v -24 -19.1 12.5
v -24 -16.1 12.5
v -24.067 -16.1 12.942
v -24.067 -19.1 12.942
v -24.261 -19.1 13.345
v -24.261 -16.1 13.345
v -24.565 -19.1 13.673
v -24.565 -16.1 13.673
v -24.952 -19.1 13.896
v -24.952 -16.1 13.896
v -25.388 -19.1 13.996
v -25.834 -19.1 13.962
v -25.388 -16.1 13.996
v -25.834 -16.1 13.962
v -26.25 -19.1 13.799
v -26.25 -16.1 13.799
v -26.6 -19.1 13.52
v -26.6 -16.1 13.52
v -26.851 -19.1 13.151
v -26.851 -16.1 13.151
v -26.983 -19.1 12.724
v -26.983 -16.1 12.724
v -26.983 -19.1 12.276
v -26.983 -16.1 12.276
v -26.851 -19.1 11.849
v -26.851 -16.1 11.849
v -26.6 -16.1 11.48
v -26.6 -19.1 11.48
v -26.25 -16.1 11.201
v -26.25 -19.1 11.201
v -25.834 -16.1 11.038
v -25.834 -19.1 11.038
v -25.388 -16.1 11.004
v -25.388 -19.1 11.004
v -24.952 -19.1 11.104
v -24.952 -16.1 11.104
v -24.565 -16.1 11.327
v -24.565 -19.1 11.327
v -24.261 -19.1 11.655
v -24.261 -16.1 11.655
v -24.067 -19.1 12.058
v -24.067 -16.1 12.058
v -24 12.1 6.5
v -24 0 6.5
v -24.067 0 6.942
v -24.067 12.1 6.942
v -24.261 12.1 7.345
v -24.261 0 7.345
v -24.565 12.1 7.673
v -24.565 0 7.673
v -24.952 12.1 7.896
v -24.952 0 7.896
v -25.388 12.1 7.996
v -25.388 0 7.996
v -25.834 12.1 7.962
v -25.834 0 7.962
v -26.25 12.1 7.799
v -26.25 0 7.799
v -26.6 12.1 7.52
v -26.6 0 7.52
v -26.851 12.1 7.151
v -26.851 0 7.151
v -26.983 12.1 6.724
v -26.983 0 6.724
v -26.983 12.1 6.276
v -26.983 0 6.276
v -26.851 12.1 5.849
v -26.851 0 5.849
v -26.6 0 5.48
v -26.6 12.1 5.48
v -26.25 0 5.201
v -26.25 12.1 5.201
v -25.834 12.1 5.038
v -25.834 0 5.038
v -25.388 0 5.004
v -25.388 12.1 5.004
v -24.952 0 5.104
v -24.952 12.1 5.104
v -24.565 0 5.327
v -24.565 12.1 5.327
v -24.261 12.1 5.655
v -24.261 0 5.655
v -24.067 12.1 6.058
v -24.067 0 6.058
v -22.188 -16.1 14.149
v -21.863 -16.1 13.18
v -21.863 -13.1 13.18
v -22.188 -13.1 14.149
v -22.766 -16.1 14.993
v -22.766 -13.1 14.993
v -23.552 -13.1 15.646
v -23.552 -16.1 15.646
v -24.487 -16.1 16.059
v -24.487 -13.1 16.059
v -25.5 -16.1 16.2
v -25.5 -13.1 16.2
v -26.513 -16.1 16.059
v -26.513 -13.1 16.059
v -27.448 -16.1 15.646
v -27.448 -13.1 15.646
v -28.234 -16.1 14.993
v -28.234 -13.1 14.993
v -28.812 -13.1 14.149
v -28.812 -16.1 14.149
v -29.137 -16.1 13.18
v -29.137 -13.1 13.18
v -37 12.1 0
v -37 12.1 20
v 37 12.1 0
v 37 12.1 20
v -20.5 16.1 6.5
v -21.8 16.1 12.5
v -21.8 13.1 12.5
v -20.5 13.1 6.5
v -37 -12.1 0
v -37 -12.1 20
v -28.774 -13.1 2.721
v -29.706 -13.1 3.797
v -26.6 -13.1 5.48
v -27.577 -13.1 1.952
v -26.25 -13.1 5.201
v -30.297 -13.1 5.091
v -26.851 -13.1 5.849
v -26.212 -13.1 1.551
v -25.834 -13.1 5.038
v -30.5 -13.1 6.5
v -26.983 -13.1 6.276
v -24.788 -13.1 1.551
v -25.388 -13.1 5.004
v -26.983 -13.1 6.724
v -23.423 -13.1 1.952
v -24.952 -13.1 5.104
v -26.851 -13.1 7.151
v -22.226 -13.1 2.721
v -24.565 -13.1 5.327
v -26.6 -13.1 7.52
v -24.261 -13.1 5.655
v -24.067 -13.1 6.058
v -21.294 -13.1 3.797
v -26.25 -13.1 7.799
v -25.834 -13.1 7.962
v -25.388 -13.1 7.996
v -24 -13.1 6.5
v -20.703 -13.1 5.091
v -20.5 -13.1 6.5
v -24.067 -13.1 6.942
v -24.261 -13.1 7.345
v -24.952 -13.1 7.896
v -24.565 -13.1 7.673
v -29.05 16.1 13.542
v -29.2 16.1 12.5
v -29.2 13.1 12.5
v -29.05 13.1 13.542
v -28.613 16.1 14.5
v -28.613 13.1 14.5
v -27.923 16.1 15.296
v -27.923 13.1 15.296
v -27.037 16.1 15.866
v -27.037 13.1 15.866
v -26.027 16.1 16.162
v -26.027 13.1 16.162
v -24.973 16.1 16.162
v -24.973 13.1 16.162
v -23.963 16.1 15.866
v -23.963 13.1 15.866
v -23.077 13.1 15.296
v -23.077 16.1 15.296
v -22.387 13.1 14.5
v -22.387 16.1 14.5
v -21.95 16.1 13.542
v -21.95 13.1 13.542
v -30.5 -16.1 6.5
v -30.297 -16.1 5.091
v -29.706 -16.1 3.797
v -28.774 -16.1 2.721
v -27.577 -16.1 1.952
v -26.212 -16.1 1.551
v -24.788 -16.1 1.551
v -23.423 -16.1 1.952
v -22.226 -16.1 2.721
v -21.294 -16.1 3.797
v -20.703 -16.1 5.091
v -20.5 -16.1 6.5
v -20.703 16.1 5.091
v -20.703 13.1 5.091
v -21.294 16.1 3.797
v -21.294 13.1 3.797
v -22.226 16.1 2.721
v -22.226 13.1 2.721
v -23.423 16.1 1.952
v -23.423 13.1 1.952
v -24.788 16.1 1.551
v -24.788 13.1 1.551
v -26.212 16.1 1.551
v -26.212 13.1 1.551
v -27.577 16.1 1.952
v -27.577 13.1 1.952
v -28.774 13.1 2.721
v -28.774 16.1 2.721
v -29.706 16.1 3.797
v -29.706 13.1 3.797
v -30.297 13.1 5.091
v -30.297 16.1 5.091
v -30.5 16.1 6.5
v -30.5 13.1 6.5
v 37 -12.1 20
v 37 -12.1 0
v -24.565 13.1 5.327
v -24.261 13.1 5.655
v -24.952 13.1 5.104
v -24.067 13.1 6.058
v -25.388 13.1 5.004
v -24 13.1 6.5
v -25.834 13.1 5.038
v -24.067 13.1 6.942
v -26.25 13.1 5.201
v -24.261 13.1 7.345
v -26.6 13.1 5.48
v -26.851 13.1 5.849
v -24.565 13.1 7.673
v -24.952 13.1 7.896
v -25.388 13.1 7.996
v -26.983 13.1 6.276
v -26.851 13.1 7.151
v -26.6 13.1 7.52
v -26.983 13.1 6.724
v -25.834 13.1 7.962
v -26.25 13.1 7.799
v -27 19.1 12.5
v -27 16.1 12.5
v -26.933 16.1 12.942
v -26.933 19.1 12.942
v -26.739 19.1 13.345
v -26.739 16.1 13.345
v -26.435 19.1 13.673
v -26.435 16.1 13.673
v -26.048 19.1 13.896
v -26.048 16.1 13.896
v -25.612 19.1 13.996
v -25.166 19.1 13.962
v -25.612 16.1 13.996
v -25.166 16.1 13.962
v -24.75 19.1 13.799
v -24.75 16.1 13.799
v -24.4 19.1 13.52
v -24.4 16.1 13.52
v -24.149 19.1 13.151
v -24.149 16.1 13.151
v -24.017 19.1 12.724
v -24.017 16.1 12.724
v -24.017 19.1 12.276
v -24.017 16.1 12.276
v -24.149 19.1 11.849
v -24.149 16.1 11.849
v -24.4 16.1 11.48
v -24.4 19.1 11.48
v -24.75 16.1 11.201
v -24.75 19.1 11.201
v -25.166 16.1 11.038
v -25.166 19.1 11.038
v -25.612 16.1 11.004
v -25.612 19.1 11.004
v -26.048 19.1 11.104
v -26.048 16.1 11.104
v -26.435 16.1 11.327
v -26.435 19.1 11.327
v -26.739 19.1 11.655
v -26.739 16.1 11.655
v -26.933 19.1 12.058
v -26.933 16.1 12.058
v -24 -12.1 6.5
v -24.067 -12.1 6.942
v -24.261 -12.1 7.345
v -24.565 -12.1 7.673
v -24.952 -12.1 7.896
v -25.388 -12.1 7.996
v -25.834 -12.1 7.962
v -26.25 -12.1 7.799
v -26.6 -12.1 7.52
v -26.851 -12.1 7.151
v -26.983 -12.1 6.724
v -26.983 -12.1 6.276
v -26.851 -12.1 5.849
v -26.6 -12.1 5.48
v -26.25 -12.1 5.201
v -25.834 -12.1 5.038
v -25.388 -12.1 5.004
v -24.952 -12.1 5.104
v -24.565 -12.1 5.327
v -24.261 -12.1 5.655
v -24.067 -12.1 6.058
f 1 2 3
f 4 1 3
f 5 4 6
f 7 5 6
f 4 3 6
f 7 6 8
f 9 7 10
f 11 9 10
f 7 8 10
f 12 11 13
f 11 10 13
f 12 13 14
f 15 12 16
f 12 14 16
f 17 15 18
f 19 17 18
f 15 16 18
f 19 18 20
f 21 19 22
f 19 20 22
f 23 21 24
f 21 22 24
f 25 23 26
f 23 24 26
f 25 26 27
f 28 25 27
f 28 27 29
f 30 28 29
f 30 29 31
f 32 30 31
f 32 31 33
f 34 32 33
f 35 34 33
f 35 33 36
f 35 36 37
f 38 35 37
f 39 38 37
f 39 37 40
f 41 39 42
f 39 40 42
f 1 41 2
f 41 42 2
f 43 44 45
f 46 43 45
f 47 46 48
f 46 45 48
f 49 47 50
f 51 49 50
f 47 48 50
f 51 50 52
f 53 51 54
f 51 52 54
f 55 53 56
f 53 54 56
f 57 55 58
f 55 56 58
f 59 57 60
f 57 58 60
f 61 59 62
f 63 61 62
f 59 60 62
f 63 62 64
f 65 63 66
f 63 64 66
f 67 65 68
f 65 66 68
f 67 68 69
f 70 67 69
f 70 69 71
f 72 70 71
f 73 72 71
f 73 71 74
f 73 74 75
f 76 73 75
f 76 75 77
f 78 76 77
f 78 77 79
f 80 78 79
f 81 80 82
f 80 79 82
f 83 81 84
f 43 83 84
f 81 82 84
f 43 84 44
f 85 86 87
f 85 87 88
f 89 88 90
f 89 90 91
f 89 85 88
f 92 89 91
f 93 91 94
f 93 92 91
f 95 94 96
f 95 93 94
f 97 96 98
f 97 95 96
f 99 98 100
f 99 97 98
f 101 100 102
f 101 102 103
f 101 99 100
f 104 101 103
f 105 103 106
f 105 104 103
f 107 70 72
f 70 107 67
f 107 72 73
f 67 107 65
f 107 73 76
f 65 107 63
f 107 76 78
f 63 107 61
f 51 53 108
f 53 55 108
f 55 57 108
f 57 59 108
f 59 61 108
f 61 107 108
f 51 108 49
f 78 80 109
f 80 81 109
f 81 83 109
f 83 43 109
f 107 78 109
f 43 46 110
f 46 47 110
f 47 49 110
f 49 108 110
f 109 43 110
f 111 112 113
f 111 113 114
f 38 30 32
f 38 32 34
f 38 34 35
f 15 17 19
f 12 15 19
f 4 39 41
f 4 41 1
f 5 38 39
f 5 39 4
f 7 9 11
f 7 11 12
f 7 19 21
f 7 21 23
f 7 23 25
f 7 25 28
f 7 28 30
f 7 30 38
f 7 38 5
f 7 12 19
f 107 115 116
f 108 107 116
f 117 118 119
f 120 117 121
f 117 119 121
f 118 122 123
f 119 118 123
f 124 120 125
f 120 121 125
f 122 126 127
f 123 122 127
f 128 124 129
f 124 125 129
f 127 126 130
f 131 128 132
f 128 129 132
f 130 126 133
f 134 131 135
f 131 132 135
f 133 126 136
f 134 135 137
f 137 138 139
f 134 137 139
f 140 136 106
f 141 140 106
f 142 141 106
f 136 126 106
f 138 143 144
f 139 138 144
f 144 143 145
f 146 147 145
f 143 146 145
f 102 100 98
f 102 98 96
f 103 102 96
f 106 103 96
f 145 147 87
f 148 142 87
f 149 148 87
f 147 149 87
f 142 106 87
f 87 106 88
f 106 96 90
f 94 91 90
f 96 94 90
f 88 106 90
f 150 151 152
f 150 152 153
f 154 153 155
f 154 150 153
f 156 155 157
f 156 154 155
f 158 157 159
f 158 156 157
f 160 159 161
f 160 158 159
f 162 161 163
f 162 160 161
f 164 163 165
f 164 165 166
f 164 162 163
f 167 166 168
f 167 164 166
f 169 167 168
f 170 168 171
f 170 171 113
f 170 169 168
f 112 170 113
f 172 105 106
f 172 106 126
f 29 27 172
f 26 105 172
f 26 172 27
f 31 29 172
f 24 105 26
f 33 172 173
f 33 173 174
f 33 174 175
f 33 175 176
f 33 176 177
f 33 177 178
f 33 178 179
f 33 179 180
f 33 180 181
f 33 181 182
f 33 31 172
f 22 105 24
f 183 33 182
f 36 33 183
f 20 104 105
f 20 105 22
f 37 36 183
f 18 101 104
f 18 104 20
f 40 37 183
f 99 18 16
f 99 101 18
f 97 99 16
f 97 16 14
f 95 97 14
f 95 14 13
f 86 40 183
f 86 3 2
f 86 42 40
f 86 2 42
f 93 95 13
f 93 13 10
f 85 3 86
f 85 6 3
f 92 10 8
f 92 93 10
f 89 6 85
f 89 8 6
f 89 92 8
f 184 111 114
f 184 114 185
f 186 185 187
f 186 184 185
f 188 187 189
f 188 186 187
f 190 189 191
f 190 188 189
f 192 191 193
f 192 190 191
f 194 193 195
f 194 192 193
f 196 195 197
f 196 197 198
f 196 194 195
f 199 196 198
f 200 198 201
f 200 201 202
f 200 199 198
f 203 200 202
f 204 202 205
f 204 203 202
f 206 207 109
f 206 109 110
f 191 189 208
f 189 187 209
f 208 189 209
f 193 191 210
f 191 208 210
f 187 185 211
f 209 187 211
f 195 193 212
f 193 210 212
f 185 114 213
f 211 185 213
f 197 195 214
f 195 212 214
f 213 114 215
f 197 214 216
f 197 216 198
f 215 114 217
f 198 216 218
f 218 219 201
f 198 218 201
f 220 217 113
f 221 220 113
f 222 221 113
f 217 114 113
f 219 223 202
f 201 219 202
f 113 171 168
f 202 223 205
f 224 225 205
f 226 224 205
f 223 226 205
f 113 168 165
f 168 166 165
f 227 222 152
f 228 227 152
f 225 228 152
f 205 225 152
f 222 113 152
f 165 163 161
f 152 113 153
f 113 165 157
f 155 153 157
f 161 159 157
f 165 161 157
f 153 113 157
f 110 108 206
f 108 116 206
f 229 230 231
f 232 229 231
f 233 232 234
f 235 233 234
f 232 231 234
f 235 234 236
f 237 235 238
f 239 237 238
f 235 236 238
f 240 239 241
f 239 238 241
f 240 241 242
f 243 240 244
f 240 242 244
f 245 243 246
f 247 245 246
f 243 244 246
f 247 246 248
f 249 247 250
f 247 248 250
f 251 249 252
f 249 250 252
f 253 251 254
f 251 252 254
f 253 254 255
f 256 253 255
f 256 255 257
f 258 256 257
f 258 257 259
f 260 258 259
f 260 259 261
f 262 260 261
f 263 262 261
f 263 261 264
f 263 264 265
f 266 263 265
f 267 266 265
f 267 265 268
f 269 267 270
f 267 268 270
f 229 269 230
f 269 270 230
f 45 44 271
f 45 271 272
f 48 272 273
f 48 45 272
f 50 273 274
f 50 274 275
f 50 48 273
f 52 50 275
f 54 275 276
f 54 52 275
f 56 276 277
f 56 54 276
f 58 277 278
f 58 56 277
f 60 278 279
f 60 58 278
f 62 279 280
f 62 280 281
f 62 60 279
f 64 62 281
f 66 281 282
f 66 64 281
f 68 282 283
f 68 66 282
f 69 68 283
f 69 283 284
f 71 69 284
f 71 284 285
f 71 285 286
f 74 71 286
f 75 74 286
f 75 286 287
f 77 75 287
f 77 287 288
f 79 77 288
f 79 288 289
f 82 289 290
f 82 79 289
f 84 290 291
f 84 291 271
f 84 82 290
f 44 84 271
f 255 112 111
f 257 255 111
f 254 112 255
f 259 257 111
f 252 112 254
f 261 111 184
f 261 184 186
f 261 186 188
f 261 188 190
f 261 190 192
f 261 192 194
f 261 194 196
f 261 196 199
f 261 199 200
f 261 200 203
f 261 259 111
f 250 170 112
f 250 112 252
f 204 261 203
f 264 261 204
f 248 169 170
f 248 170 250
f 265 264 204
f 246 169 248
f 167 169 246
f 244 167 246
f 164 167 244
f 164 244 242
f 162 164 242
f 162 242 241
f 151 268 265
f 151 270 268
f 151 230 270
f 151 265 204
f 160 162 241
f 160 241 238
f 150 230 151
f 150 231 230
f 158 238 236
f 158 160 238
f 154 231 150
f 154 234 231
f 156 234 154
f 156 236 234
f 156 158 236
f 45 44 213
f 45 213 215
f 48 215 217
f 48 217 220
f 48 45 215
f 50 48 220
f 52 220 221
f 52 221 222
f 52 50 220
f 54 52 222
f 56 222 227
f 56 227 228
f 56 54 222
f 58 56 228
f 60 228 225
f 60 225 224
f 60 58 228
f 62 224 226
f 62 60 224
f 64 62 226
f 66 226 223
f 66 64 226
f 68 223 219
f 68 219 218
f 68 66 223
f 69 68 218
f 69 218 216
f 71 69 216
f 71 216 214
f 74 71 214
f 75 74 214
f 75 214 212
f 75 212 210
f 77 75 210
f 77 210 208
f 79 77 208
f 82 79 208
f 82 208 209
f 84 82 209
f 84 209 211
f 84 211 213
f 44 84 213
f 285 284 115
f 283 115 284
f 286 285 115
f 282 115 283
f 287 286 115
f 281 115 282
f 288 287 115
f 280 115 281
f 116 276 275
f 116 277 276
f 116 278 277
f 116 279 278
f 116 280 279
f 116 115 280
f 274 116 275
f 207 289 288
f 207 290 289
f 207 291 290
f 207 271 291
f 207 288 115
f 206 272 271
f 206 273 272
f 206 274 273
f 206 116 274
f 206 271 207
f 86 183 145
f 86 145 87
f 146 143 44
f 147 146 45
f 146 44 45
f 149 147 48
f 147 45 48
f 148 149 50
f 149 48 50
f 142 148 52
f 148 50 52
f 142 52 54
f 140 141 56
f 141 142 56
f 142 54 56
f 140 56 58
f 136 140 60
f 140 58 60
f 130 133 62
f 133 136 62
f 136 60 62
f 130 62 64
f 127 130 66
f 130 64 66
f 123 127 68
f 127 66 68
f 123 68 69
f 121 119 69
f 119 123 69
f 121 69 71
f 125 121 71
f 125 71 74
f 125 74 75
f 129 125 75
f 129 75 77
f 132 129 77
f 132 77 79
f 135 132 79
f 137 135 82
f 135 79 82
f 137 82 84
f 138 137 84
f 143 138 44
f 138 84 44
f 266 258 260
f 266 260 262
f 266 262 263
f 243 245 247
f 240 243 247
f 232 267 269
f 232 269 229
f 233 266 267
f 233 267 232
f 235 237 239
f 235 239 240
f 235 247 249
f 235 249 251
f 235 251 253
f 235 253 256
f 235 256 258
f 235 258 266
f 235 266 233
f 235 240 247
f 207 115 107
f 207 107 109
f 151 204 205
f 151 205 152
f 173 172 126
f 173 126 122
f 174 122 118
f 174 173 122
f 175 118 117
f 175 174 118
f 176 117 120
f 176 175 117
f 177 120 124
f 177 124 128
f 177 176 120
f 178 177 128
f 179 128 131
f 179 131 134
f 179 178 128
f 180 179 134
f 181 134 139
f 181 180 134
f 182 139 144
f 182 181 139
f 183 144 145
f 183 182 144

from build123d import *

# Parameters (mm, degrees)
F0_W          = 74
F0_H          = 20
F0_R          = 1.5
F1_DEPTH      = 12.1
F1_DEPTH_BACK = 12.1
F2_R          = 1.5
F3_DEPTH      = 16.1
F3_DEPTH_BACK = 16.1
F5_DEPTH      = 3
F7_DEPTH      = 3
F8_R          = 1.5
F9_DEPTH      = 3
F10_R         = 1.5
F11_DEPTH     = 3


with BuildPart() as f1:
    # F0 (on Front) → F1 (new body, two sides)
    with BuildSketch(Plane.XZ) as f1_sk:
        with Locations((0, 10)):
            Rectangle(F0_W, F0_H)
        with Locations((-25.5, 6.5)):
            Circle(F0_R, mode=Mode.SUBTRACT)
    extrude(amount=F1_DEPTH)
    extrude(f1_sk.sketch, amount=-F1_DEPTH_BACK)


with BuildPart() as f3:
    # F2 (on Front) → F3 (new body, two sides)
    with BuildSketch(Plane.XZ) as f3_sk:
        with Locations((-25.5, 6.5)):
            Circle(F2_R)
    extrude(amount=-F3_DEPTH)
    extrude(f3_sk.sketch, amount=F3_DEPTH_BACK)

    # F4 (on face) → F5 (join)
    with BuildSketch(Plane.XZ.offset(16.1)):
        with BuildLine():
            Line((-29.1369761363, 13.1800033706), (-30.5, 6.5000007141))
            ThreePointArc((-30.5, 6.5000007141), (-25.5, 1.5), (-20.5, 6.5000007141))
            Line((-20.5, 6.5000007141), (-21.8630238637, 13.1800033706))
            ThreePointArc((-21.8630238637, 13.1800033706), (-25.5, 16.2), (-29.1369761363, 13.1800033706))
        make_face()
    extrude(amount=-F5_DEPTH)

    # F6 (on face) → F7 (join)
    with BuildSketch(Plane(origin=(0, 16.1, 0), x_dir=(-1, 0, 0), z_dir=(0, 1, 0))):
        with BuildLine():
            Line((21.8, 12.4999996232), (20.5, 6.5000000586))
            ThreePointArc((20.5, 6.5000000586), (25.5, 1.5), (30.5, 6.5000000586))
            Line((30.5, 6.5000000586), (29.2, 12.4999996232))
            ThreePointArc((29.2, 12.4999996232), (25.5, 16.2), (21.8, 12.4999996232))
        make_face()
    extrude(amount=-F7_DEPTH)

    # F8 (on face) → F9 (join)
    with BuildSketch(Plane.XZ.offset(16.1)):
        with Locations((-25.5, 12.5)):
            Circle(F8_R)
    extrude(amount=F9_DEPTH)

    # F10 (on face) → F11 (join)
    with BuildSketch(Plane(origin=(0, 16.1, 0), x_dir=(-1, 0, 0), z_dir=(0, 1, 0))):
        with Locations((25.5, 12.5)):
            Circle(F10_R)
    extrude(amount=F11_DEPTH)


solid = Compound([f1.part, f3.part])
